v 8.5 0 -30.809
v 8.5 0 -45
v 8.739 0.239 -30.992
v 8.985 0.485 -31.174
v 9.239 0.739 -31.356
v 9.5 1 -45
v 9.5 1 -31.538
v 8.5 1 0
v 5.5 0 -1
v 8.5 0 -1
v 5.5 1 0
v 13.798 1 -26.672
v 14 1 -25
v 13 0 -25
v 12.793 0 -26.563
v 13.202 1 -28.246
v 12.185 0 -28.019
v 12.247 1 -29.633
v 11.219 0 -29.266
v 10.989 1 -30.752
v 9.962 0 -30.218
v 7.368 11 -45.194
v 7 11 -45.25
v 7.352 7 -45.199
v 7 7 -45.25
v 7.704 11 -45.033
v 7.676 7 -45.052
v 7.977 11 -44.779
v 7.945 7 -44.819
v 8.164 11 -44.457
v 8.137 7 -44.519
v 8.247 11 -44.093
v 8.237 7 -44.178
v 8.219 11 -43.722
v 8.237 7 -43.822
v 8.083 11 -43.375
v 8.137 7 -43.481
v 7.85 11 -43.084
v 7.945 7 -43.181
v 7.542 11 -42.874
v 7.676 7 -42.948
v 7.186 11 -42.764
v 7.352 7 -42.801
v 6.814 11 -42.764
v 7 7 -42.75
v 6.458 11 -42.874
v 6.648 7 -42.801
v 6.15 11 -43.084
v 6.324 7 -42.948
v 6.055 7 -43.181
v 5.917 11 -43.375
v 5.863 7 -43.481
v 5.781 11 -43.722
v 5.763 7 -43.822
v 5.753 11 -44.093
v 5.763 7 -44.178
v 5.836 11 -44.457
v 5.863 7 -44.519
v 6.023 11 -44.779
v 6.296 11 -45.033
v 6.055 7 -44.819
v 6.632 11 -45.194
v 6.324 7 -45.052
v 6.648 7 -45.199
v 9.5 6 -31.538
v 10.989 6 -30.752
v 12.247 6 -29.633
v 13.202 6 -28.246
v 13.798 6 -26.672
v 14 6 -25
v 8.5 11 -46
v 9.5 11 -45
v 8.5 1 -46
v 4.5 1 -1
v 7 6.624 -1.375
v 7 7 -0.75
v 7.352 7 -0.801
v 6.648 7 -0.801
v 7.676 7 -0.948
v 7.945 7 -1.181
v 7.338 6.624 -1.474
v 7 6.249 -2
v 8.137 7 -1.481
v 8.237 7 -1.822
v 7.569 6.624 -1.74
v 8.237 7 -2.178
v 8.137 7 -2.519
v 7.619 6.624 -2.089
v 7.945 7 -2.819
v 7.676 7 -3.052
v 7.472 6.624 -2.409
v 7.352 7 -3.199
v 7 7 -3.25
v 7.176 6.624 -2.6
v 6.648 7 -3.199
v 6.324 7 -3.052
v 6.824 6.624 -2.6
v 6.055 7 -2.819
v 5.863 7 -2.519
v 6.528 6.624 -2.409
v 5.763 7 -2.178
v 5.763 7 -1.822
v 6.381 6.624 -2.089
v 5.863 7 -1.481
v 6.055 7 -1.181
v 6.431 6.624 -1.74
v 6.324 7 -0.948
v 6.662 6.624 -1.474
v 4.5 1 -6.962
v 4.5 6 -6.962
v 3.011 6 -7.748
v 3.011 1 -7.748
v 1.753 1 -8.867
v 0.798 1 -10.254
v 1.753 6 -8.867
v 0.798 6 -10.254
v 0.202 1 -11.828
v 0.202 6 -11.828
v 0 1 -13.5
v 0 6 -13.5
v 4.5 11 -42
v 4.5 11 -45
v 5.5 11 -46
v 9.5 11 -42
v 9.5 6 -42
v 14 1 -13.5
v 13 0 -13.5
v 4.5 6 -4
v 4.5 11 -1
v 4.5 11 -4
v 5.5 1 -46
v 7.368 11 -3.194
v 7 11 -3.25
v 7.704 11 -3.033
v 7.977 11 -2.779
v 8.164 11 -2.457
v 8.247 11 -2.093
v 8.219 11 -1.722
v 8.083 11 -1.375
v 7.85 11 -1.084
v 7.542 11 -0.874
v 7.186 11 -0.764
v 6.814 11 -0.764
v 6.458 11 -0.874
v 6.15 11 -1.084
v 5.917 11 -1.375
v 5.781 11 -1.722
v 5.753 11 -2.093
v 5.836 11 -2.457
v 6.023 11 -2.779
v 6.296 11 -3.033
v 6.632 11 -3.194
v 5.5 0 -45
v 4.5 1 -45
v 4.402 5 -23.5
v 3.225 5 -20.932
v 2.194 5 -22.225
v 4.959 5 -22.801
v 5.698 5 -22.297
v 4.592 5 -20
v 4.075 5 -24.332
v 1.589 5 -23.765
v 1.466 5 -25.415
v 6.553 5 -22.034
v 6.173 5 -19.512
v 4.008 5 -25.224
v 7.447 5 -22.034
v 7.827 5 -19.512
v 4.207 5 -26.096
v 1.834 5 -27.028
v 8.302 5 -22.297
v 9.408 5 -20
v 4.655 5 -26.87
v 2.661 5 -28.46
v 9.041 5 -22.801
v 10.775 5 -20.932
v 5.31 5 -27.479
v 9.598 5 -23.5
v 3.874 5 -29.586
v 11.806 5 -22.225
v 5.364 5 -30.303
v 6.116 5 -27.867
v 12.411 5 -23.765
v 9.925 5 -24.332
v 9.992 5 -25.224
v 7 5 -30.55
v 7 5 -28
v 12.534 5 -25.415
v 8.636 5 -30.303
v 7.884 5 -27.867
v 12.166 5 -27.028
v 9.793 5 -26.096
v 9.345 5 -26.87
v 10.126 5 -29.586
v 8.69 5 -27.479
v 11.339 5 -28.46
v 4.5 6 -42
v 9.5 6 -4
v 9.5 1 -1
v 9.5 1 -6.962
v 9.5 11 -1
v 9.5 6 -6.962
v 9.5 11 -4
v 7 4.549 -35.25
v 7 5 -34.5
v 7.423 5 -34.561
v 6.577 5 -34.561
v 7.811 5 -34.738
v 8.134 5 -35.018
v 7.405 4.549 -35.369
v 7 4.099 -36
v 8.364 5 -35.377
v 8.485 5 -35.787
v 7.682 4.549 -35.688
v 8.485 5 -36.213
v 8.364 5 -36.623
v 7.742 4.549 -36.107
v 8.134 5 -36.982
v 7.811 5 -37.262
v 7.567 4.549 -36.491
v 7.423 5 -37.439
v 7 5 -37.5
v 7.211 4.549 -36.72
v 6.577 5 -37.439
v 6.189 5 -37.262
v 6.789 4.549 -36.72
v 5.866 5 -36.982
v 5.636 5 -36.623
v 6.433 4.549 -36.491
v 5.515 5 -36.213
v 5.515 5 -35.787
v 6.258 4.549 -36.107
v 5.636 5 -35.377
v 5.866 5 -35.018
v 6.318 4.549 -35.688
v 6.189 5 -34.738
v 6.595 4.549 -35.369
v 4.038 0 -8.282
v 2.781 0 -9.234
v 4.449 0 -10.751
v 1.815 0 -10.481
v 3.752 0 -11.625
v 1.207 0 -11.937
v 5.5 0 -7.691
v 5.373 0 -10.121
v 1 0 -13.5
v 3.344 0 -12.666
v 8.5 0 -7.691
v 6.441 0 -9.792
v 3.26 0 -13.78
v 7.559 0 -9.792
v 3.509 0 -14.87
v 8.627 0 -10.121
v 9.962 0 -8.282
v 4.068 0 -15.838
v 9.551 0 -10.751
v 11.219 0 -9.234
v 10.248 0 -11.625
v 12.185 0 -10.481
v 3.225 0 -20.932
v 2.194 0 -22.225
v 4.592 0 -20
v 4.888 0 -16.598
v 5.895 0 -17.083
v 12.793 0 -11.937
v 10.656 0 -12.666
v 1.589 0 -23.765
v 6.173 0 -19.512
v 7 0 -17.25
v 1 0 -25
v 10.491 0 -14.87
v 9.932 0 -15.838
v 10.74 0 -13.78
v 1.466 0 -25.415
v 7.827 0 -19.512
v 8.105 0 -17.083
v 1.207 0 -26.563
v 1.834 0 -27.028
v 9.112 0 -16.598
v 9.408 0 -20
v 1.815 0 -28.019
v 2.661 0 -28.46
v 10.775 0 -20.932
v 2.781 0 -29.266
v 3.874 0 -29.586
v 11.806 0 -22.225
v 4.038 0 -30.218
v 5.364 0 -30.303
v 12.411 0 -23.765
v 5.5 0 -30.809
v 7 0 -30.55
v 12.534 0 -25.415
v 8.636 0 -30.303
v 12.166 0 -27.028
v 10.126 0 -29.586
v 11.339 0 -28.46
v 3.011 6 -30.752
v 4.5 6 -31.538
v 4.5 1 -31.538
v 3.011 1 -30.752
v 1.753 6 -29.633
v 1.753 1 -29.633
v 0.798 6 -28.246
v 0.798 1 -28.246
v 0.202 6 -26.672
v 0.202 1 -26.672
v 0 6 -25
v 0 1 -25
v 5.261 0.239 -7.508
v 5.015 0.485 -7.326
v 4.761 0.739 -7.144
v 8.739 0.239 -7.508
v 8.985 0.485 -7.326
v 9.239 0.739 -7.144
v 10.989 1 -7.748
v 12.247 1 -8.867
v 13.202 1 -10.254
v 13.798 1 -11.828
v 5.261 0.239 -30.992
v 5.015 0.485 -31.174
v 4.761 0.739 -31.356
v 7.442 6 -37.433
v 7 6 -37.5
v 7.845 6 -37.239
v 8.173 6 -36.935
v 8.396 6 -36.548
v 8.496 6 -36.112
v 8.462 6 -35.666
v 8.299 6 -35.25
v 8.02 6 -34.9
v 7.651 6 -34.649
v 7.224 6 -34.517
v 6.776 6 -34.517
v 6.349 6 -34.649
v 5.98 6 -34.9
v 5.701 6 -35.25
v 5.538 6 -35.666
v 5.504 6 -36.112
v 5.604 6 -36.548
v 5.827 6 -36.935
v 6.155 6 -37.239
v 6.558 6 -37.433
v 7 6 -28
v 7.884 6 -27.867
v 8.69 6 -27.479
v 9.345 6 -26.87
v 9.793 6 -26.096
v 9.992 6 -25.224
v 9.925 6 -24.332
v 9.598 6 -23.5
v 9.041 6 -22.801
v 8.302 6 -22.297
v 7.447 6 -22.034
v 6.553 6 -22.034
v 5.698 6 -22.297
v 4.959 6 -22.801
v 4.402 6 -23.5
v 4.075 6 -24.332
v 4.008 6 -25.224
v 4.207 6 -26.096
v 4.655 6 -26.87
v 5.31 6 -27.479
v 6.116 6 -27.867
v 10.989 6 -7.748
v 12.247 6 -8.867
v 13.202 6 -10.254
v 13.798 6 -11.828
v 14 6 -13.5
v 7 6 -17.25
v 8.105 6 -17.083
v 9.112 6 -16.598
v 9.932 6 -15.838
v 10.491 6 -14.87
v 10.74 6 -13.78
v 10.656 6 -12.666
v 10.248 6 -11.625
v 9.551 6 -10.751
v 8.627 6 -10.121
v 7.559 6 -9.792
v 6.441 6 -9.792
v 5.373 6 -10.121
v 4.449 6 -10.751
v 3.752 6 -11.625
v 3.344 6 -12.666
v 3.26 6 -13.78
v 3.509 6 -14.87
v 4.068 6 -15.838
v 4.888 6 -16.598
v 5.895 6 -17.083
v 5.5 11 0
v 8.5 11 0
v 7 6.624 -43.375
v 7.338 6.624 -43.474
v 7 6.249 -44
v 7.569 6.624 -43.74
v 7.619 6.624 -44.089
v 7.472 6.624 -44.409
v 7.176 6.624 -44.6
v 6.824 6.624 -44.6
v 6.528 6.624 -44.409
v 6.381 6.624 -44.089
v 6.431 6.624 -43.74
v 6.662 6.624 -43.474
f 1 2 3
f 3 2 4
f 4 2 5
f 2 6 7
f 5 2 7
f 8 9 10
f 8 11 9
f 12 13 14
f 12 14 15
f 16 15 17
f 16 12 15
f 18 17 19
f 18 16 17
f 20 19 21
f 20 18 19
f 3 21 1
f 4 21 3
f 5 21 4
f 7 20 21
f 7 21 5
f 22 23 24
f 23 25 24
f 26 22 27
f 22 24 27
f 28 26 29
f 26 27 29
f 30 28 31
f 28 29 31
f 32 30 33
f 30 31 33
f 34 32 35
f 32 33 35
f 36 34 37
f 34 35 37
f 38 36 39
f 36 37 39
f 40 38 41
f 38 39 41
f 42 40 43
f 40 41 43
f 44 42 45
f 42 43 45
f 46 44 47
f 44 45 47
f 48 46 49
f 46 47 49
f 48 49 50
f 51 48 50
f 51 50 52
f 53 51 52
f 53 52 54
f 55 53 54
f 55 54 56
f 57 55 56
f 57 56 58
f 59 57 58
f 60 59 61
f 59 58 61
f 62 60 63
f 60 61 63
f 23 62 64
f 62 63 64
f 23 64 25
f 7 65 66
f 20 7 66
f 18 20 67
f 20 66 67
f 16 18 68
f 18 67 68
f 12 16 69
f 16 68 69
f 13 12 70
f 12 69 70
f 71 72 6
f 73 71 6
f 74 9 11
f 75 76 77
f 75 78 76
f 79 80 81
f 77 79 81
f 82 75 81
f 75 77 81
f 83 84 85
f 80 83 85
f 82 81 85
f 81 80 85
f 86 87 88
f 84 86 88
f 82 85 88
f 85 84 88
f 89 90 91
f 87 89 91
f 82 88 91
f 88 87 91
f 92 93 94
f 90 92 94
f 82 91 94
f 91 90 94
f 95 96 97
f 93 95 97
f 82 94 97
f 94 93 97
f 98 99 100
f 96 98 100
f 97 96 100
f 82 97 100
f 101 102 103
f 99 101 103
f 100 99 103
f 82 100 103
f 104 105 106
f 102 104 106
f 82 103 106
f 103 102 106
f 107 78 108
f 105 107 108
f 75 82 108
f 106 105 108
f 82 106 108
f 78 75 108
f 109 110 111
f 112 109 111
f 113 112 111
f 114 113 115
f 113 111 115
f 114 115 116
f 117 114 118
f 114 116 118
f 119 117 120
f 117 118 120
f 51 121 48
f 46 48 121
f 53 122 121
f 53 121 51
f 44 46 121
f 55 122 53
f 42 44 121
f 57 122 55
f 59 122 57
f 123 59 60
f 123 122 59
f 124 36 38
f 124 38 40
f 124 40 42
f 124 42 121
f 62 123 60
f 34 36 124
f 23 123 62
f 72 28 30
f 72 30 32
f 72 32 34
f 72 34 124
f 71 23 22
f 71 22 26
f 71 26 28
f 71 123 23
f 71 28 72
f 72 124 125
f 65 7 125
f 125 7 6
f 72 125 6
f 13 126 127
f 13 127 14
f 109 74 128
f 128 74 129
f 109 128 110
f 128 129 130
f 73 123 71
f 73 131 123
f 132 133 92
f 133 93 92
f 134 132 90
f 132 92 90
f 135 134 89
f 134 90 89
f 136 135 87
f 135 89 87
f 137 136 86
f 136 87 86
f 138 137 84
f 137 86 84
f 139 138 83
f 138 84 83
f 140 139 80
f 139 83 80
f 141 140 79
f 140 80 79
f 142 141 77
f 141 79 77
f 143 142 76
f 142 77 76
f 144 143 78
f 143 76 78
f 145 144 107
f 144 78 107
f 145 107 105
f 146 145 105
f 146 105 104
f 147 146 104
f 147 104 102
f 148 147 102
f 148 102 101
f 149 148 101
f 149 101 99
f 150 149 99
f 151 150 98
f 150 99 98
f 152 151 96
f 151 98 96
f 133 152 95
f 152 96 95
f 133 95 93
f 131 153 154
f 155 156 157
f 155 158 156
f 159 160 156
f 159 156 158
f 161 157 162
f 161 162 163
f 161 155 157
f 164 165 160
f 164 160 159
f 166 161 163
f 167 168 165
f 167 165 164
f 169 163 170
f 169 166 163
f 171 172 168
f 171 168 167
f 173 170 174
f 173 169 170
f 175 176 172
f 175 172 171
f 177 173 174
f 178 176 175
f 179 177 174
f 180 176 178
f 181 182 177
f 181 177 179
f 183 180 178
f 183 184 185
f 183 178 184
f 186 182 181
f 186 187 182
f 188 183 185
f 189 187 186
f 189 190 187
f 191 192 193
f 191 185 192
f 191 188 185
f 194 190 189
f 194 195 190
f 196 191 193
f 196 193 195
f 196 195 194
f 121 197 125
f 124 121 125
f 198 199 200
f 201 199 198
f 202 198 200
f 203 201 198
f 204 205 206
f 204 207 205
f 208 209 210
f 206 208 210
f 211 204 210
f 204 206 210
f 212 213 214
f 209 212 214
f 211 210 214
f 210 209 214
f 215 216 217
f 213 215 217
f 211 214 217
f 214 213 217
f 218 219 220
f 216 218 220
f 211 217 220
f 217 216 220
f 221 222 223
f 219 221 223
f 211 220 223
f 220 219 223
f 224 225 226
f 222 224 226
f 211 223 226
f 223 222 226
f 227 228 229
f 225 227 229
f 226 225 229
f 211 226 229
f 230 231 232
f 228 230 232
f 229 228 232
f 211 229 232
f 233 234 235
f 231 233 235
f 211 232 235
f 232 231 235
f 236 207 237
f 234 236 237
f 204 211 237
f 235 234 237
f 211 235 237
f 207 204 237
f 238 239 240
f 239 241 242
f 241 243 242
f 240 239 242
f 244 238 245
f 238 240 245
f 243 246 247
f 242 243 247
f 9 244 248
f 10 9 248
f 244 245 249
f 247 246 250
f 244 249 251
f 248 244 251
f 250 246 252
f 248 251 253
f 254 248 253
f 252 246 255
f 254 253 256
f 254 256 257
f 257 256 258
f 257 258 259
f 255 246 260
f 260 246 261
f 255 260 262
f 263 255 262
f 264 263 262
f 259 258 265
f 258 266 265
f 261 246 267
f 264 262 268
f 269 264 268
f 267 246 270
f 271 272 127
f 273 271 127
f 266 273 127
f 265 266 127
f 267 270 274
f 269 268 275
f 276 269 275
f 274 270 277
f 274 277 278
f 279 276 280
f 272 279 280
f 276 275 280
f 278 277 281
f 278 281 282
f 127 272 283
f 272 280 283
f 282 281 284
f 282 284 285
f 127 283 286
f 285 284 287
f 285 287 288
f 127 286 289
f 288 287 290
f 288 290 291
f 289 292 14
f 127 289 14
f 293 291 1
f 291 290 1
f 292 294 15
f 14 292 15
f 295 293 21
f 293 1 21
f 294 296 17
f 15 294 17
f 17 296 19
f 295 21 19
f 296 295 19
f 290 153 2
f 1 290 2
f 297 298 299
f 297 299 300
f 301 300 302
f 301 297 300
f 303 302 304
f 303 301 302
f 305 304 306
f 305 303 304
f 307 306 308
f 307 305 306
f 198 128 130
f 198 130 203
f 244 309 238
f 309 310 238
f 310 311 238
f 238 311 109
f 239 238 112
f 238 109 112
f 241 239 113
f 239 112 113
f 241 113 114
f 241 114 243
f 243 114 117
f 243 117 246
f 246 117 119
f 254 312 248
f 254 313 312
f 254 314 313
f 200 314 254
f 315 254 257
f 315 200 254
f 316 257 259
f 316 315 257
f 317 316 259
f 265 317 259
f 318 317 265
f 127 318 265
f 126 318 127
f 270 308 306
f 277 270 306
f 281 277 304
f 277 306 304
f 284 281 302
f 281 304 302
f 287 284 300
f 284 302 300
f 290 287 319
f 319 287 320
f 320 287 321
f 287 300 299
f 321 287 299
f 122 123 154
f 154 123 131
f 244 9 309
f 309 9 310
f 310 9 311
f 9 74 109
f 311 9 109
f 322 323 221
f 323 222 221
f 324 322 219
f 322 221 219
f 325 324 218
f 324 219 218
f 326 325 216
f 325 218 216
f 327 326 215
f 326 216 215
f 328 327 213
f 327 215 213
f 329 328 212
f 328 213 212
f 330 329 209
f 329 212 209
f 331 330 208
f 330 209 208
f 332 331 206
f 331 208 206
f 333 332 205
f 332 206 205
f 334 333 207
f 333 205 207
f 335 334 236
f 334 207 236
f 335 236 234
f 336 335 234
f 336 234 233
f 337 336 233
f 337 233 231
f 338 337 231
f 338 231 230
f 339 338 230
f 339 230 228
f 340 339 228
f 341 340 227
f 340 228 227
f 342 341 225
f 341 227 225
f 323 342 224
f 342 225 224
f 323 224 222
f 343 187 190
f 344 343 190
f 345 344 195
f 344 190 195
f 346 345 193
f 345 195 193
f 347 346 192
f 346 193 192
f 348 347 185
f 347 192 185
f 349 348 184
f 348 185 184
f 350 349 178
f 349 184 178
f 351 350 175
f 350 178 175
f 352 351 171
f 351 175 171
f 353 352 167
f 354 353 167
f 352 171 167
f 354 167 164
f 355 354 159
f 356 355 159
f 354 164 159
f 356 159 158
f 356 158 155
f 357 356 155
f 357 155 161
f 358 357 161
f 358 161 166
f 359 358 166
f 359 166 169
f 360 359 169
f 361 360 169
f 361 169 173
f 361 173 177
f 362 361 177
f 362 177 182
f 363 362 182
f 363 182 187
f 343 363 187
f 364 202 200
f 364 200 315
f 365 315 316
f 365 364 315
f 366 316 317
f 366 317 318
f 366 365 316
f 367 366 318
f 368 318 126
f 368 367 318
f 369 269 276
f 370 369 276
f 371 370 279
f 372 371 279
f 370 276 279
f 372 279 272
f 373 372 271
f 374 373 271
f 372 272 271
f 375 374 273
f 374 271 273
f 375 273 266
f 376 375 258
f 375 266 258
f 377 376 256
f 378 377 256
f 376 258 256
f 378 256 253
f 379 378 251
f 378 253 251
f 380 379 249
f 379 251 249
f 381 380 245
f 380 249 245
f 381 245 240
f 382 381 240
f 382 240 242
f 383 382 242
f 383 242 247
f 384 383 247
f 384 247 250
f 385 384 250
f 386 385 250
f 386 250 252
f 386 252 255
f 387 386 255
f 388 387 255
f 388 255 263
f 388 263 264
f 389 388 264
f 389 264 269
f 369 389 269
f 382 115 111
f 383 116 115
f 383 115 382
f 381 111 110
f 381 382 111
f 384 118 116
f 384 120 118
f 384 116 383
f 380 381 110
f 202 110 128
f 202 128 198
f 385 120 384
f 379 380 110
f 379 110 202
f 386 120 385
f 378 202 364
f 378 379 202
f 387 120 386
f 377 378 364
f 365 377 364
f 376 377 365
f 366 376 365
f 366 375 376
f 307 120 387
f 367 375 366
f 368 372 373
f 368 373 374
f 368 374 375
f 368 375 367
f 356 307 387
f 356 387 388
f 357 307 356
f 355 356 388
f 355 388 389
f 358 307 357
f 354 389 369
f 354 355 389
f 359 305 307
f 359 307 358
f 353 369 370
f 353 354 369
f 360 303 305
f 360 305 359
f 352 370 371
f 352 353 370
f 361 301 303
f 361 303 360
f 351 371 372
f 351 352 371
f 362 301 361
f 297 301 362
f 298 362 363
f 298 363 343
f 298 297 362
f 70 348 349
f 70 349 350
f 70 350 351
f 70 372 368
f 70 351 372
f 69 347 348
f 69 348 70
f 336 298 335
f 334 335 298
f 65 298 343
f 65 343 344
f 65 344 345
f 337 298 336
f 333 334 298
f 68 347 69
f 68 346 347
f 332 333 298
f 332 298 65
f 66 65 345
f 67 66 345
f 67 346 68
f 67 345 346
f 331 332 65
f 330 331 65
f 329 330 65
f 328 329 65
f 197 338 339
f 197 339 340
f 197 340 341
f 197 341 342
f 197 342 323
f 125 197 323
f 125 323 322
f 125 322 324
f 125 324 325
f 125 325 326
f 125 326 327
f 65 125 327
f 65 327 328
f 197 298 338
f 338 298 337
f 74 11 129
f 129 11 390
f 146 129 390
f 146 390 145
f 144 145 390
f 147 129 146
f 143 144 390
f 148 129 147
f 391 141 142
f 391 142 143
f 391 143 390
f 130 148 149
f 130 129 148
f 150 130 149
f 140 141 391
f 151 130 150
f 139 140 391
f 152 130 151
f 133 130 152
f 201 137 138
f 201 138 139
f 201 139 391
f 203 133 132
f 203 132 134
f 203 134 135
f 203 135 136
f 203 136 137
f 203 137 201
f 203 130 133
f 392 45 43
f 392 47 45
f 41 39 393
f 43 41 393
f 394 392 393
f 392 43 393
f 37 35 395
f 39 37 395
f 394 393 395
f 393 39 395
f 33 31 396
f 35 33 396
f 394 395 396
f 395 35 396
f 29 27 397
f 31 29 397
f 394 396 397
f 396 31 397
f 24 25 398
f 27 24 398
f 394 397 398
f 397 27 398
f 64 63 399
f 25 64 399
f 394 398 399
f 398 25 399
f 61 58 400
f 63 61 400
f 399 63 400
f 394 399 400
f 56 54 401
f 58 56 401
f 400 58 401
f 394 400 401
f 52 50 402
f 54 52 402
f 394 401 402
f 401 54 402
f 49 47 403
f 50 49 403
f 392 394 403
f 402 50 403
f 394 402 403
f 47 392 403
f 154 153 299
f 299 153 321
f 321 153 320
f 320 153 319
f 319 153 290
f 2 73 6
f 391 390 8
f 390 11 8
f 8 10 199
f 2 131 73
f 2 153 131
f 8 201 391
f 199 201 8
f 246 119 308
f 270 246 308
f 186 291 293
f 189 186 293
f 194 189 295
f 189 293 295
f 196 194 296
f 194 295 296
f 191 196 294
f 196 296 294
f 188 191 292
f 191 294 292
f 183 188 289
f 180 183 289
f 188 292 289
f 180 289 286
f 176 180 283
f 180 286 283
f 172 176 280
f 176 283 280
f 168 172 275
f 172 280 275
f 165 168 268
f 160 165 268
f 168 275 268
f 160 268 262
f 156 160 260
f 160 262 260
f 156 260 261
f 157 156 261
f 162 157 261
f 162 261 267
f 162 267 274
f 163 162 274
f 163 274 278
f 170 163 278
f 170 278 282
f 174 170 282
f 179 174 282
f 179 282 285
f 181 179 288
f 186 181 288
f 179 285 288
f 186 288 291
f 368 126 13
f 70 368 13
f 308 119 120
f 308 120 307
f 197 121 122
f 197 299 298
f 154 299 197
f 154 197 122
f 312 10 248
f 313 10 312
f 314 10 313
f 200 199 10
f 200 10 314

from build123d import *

# Parameters (mm, degrees)
ESBO_O2_W                                   = 14
ESBO_O2_H                                   = 46
RESSALTO_EXTRUS_O1_DEPTH                    = 6
CORTE_EXTRUS_O1_DEPTH                       = 49.456165758
FURO_DE_DI_METRO_7_5_7_5_1_D                = 7.5
CORTE_EXTRUS_O2_DEPTH                       = 49.456165758
ESBO_O10_W                                  = 5
ESBO_O10_H                                  = 4
RESSALTO_EXTRUS_O2_DEPTH                    = 5
BROCA_DE_ROSQUEAR_PARA_TARRAXA_DE_M31_D     = 2.5
BROCA_DE_ROSQUEAR_PARA_TARRAXA_DE_M31_DEPTH = 4
BROCA_DE_ROSQUEAR_PARA_TARRAXA_DE_M31_TIP   = 0.751075774
FURO_DE_DI_METRO_6_0_6_1_D                  = 6
CHANFRO1_SIZE                               = 1
FURO_DE_DI_METRO_3_0_3_1_D                  = 3
FURO_DE_DI_METRO_3_0_3_1_DEPTH              = 1
FURO_DE_DI_METRO_3_0_3_1_TIP                = 0.901290929
ESBO_O14_R                                  = 5.55
CORTE_EXTRUS_O4_DEPTH                       = 5


with BuildPart() as part:
    # Esboço2 → Ressalto-extrusão1 (new body)
    with BuildSketch(Plane(origin=(0, 0, 0), x_dir=(1, 0, 0), z_dir=(0, 1, 0))):
        with Locations((7, 23)):
            Rectangle(ESBO_O2_W, ESBO_O2_H)
    extrude(amount=RESSALTO_EXTRUS_O1_DEPTH)

    # Esboço6 → Corte-extrusão1 (cut, through all)
    with BuildSketch(Plane(origin=(0, 6, 0), x_dir=(1, 0, 0), z_dir=(0, 1, 0))):
        with BuildLine():
            Line((4.5, 46), (4.5, 31.538348415))
            ThreePointArc((4.5, 31.538348415), (1.233718703, 28.968626967), (0, 25))
            Line((0, 25), (0, 46))
            Line((0, 46), (4.5, 46))
        make_face()
        with BuildLine():
            Line((9.5, 46), (9.5, 31.538348415))
            ThreePointArc((9.5, 31.538348415), (12.766281297, 28.968626967), (14, 25))
            Line((14, 25), (14, 46))
            Line((14, 46), (9.5, 46))
        make_face()
    extrude(amount=-CORTE_EXTRUS_O1_DEPTH, mode=Mode.SUBTRACT)

    # Furo de diâmetro Ø7.5 (7.5)1 (through all)
    with Locations(Plane(origin=(7, 6, -13.5), x_dir=(0, 0, 1), z_dir=(0, 1, 0))):
        with Locations((0, 0)):
            Hole(FURO_DE_DI_METRO_7_5_7_5_1_D / 2)

    # Esboço9 → Corte-extrusão2 (cut, through all)
    with BuildSketch(Plane(origin=(0, 6, 0), x_dir=(1, 0, 0), z_dir=(0, 1, 0))):
        with BuildLine():
            Line((0, 13.5), (0, 0))
            Line((0, 0), (4.5, 0))
            Line((4.5, 0), (4.5, 6.961651585))
            ThreePointArc((4.5, 6.961651585), (1.233718703, 9.531373033), (0, 13.5))
        make_face()
        with BuildLine():
            Line((9.5, 0), (9.5, 6.961651585))
            ThreePointArc((9.5, 6.961651585), (12.766281297, 9.531373033), (14, 13.5))
            Line((14, 13.5), (14, 0))
            Line((14, 0), (9.5, 0))
        make_face()
    extrude(amount=-CORTE_EXTRUS_O2_DEPTH, mode=Mode.SUBTRACT)

    # Esboço10 → Ressalto-extrusão2 (add)
    with BuildSketch(Plane(origin=(0, 6, 0), x_dir=(1, 0, 0), z_dir=(0, 1, 0))):
        with Locations((7, 44)):
            Rectangle(ESBO_O10_W, ESBO_O10_H)
        with Locations((7, 2)):
            Rectangle(ESBO_O10_W, ESBO_O10_H)
    extrude(amount=RESSALTO_EXTRUS_O2_DEPTH)

    # Broca de rosquear para tarraxa de M31
    with Locations(Plane(origin=(7, 11, -2), x_dir=(0, 0, 1), z_dir=(0, 1, 0))):
        with Locations((0, 0), (-42, 0)):
            Hole(BROCA_DE_ROSQUEAR_PARA_TARRAXA_DE_M31_D / 2, depth=BROCA_DE_ROSQUEAR_PARA_TARRAXA_DE_M31_DEPTH)
            with Locations((0, 0, -(BROCA_DE_ROSQUEAR_PARA_TARRAXA_DE_M31_DEPTH + BROCA_DE_ROSQUEAR_PARA_TARRAXA_DE_M31_TIP / 2))):  # 118° drill point
                Cone(0, BROCA_DE_ROSQUEAR_PARA_TARRAXA_DE_M31_D / 2, BROCA_DE_ROSQUEAR_PARA_TARRAXA_DE_M31_TIP, mode=Mode.SUBTRACT)

    # Furo de diâmetro Ø6.0 (6)1 (through all)
    with Locations(Plane(origin=(7, 6, -25), x_dir=(0, 0, 1), z_dir=(0, 1, 0))):
        with Locations((0, 0)):
            Hole(FURO_DE_DI_METRO_6_0_6_1_D / 2)

    # Chanfro1
    chanfro1_edges = [part.edges().sort_by_distance(p)[0] for p in [
        (0, 0, -19.25),
        (7, 0, -46),
        (9.5, 5.5, -46),
        (12.766281297, 0, -28.968626967),
        (9.5, 0, -38.769174208),
        (4.5, 0, -38.769174208),
        (4.5, 5.5, -46),
        (1.233718703, 0, -28.968626967),
        (14, 0, -19.25),
        (7, 0, 0),
        (1.233718703, 0, -9.531373033),
        (4.5, 0, -3.480825792),
        (4.5, 5.5, 0),
        (9.5, 0, -3.480825792),
        (9.5, 5.5, 0),
        (12.766281297, 0, -9.531373033),
    ]]
    chamfer(chanfro1_edges, length=CHANFRO1_SIZE)

    # Furo de diâmetro Ø3.0 (3)1
    with Locations(Plane(origin=(7, 6, -36), x_dir=(0, 0, 1), z_dir=(0, 1, 0))):
        with Locations((0, 0)):
            Hole(FURO_DE_DI_METRO_3_0_3_1_D / 2, depth=FURO_DE_DI_METRO_3_0_3_1_DEPTH)
            with Locations((0, 0, -(FURO_DE_DI_METRO_3_0_3_1_DEPTH + FURO_DE_DI_METRO_3_0_3_1_TIP / 2))):  # 118° drill point
                Cone(0, FURO_DE_DI_METRO_3_0_3_1_D / 2, FURO_DE_DI_METRO_3_0_3_1_TIP, mode=Mode.SUBTRACT)

    # Esboço14 → Corte-extrusão4 (cut)
    with BuildSketch(Plane.XZ):
        with Locations(Location((7, -25, 0), (0, 0, 270))):
            Circle(ESBO_O14_R)
    extrude(amount=-CORTE_EXTRUS_O4_DEPTH, mode=Mode.SUBTRACT)


solid = part.part
